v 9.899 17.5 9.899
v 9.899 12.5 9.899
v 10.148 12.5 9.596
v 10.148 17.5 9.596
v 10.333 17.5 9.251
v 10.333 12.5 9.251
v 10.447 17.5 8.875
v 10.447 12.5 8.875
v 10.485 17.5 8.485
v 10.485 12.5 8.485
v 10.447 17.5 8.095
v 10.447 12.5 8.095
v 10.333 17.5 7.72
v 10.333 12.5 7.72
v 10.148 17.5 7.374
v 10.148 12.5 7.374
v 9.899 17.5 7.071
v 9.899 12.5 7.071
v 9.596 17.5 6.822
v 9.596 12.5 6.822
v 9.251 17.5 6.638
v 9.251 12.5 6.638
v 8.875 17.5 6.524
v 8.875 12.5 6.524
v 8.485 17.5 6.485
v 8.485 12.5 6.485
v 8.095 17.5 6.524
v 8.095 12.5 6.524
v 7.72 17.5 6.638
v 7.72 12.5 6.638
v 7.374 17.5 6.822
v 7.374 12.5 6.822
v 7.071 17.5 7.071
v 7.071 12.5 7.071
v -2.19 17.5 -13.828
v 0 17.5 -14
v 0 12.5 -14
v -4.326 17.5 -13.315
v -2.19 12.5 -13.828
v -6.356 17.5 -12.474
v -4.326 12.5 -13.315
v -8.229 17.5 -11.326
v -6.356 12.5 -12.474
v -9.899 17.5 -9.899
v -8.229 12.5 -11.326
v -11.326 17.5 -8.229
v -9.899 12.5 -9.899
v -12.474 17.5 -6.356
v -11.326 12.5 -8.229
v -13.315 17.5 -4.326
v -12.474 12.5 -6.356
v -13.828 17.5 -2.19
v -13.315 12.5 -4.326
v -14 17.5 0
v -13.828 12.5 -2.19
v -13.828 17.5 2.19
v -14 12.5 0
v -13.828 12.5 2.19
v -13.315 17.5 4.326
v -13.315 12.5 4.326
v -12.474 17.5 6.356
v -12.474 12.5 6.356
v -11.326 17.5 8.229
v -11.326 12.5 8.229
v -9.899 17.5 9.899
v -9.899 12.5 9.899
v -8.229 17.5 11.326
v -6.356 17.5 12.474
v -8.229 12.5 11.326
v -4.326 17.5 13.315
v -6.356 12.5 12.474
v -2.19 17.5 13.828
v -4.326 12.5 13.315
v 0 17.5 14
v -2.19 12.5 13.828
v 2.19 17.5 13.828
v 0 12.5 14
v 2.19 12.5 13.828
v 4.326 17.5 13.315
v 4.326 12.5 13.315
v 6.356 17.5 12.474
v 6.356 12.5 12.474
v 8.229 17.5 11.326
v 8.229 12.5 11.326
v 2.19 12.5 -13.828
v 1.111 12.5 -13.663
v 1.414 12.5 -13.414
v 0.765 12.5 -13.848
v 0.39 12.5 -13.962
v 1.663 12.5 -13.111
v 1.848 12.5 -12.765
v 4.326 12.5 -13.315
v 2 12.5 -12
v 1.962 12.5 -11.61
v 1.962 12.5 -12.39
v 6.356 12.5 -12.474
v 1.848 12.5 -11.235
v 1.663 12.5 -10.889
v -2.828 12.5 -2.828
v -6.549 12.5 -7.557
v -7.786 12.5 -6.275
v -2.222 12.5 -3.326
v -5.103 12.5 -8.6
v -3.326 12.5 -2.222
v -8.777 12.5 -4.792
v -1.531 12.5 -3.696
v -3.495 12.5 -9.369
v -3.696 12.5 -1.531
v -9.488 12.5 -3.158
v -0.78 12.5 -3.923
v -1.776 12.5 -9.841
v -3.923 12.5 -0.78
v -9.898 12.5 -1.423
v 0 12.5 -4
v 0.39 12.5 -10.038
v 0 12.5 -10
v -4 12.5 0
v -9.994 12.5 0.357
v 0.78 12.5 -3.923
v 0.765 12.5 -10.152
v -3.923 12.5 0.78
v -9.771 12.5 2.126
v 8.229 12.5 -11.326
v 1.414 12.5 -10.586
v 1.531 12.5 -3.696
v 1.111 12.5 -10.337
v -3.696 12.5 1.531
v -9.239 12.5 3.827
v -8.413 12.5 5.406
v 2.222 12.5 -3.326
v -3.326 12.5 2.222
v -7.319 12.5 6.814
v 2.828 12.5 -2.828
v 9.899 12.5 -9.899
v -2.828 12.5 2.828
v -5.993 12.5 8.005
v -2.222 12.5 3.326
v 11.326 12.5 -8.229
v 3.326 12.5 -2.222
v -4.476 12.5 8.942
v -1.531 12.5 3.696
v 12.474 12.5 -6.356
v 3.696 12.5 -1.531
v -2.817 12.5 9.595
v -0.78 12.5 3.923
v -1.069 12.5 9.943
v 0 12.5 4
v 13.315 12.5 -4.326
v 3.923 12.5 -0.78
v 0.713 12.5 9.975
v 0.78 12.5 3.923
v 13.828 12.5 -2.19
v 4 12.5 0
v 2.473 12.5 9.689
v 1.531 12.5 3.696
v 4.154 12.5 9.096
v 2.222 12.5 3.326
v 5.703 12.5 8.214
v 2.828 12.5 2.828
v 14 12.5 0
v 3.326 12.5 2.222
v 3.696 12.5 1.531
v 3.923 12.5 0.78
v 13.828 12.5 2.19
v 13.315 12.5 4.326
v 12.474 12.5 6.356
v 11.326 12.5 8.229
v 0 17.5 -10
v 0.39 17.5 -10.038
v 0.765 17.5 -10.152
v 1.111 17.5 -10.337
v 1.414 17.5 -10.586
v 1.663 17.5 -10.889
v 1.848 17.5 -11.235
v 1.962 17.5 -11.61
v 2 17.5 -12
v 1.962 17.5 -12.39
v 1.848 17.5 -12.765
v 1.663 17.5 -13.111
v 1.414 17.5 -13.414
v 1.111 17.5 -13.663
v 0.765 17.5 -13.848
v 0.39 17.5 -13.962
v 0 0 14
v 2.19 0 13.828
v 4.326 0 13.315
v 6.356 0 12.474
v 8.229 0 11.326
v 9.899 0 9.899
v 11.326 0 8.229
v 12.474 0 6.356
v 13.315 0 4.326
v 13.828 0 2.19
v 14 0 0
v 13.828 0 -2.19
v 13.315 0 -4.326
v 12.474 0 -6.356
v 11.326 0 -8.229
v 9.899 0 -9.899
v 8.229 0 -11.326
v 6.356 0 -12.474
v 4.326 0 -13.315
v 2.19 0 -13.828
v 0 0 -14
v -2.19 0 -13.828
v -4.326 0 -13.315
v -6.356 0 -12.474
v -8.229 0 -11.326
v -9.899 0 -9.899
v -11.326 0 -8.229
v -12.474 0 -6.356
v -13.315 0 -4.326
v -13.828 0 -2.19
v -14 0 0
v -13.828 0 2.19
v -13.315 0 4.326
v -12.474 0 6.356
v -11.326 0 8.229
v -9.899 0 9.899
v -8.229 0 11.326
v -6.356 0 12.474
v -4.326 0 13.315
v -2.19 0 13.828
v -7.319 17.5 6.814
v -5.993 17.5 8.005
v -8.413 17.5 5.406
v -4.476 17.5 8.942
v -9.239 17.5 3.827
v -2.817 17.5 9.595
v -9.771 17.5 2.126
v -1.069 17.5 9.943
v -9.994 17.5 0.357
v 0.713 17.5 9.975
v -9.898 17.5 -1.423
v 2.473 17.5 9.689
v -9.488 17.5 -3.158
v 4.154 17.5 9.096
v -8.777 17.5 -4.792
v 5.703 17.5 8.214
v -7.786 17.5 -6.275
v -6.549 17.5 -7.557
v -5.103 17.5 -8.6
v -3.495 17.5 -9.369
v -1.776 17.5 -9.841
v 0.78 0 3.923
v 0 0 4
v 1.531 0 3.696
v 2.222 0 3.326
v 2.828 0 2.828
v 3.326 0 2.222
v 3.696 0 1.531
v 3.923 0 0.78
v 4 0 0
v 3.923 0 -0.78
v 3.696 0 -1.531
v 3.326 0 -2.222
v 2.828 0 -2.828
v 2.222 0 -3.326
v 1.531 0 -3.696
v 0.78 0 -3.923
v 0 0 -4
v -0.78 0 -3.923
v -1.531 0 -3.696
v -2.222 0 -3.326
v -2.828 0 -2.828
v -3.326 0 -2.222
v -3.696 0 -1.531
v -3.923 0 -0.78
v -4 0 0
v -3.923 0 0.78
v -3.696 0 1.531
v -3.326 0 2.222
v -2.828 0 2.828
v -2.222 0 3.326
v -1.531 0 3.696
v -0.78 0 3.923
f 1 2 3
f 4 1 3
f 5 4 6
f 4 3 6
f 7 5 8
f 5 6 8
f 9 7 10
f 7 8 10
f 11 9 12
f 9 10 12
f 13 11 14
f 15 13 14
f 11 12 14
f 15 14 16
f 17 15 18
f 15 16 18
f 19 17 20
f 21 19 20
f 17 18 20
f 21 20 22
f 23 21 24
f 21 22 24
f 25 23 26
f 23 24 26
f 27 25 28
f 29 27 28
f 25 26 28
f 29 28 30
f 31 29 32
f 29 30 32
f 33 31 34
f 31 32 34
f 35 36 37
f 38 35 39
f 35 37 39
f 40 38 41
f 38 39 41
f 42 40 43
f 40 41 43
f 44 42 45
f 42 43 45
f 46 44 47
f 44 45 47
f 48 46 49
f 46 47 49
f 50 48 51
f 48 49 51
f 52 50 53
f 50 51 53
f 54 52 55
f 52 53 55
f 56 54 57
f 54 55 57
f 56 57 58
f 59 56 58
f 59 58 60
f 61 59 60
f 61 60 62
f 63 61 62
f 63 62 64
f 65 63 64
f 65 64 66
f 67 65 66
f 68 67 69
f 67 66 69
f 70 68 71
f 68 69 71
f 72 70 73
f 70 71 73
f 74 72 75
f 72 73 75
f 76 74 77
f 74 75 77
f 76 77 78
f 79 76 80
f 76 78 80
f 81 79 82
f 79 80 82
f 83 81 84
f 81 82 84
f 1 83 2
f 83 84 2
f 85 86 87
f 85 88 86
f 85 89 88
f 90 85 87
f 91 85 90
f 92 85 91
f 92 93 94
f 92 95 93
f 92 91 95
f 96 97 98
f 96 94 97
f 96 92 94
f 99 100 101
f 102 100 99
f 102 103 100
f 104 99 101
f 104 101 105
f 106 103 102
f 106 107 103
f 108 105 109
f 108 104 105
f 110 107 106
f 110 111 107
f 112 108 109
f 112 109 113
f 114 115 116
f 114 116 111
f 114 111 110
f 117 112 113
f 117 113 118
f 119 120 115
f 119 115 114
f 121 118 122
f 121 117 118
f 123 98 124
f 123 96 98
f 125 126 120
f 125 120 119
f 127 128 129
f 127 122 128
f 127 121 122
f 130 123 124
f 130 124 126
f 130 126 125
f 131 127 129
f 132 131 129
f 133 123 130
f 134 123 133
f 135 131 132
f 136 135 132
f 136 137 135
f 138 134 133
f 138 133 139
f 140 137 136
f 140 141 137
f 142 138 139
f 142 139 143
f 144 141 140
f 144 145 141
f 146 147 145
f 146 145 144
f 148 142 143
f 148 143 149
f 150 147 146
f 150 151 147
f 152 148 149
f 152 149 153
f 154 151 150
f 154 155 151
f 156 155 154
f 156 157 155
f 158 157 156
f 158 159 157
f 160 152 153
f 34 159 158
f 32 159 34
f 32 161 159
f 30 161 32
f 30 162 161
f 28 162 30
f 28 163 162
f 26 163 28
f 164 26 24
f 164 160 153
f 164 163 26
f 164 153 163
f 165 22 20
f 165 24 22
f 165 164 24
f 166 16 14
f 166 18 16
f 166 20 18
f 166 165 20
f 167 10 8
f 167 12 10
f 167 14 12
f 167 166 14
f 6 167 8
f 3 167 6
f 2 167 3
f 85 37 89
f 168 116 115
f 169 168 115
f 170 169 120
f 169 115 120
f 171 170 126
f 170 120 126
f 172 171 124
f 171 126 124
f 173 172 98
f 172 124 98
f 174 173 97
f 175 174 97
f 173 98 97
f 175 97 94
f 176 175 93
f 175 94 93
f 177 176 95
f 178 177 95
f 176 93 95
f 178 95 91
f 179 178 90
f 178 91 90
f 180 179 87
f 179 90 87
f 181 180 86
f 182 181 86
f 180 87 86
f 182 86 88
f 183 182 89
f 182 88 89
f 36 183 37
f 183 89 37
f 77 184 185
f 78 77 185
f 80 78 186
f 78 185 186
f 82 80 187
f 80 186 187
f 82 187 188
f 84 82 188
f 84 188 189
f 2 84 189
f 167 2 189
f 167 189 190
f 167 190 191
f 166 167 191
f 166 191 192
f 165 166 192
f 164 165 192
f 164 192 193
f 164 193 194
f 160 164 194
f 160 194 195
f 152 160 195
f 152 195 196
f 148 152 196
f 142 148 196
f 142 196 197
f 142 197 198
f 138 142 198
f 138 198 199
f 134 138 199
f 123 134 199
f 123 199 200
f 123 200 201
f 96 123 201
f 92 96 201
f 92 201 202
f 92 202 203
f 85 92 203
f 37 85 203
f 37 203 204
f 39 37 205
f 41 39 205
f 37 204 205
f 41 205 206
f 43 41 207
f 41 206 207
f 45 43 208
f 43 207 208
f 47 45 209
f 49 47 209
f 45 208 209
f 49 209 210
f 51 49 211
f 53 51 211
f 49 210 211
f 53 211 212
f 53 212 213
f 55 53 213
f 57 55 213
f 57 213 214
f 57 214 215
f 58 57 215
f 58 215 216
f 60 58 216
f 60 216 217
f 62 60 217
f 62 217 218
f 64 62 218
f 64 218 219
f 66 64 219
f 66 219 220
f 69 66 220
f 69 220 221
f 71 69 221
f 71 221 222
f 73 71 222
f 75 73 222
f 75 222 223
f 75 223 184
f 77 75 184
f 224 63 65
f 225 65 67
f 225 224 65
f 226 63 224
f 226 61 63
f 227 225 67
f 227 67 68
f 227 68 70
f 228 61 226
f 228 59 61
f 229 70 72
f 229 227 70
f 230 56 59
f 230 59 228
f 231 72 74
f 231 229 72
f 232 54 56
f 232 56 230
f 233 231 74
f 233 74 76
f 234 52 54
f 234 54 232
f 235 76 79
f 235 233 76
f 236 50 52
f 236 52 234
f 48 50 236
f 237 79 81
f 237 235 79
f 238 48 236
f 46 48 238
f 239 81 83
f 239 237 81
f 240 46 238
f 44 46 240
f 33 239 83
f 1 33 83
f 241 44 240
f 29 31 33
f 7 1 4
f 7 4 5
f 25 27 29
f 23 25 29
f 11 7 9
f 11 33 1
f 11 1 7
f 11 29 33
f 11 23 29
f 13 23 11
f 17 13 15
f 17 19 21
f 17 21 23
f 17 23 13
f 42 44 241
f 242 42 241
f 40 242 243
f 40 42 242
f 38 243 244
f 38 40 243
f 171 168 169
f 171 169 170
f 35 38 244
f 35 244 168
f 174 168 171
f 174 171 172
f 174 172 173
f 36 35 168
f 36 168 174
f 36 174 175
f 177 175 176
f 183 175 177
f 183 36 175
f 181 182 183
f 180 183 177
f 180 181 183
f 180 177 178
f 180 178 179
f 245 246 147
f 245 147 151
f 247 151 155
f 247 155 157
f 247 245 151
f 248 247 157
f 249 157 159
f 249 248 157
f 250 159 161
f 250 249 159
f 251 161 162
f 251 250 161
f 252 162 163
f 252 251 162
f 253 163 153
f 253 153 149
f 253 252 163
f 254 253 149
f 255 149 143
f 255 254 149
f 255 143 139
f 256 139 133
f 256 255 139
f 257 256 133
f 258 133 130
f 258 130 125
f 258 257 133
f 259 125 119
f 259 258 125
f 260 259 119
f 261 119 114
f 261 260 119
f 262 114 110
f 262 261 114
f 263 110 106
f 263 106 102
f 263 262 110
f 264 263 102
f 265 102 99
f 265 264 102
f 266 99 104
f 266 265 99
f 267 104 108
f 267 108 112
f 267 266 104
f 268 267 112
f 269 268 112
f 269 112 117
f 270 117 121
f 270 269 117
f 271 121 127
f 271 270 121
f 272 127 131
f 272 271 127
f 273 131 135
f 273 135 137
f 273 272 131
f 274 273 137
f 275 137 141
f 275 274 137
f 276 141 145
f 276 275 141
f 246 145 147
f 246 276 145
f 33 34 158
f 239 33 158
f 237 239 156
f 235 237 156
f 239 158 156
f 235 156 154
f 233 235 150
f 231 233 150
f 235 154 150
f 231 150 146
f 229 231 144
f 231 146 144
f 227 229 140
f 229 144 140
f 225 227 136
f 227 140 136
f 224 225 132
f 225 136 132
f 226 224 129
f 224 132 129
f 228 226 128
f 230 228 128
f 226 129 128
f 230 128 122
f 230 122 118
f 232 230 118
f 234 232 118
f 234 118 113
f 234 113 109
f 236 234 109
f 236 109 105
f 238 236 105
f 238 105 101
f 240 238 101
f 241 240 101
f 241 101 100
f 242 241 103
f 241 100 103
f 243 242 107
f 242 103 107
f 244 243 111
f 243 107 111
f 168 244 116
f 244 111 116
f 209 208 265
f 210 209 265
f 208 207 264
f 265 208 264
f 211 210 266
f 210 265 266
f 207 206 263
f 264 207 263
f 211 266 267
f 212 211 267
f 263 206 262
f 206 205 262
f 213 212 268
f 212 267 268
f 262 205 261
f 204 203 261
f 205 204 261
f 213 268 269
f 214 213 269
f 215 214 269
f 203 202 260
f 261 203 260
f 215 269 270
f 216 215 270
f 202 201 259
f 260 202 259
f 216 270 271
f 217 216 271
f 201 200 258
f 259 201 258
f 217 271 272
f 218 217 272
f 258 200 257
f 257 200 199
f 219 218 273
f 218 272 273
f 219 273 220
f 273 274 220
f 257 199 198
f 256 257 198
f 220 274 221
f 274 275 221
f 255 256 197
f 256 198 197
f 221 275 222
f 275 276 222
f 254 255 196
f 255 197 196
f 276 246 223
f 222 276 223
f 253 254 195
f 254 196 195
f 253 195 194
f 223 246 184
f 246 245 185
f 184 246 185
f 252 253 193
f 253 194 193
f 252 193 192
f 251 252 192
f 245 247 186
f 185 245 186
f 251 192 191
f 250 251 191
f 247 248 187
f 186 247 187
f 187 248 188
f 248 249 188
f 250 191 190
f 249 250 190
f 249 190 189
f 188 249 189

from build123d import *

# Parameters (mm, degrees)
SKETCH5_R           = 14
SKETCH5_R_2         = 4
BOSS_EXTRUDE3_DEPTH = 12.5
BOSS_EXTRUDE4_DEPTH = 5


with BuildPart() as part:
    # Sketch5 → Boss-Extrude3 (new body)
    with BuildSketch(Plane(origin=(0, 0, 0), x_dir=(1, 0, 0), z_dir=(0, 1, 0))):
        with Locations(Location((0, 0, 0), (0, 0, 270))):
            Circle(SKETCH5_R)
        with Locations(Location((0, 0, 0), (0, 0, 270))):
            Circle(SKETCH5_R_2, mode=Mode.SUBTRACT)
    extrude(amount=BOSS_EXTRUDE3_DEPTH)

    # Sketch6 → Boss-Extrude4 (add)
    with BuildSketch(Plane(origin=(0, 12.5, 0), x_dir=(1, 0, 0), z_dir=(0, 1, 0))):
        with BuildLine():
            ThreePointArc((0, 14), (-12.934313455, -5.357568053), (9.899494937, -9.899494937))
            ThreePointArc((9.899494937, -9.899494937), (9.899494937, -7.071067812), (7.071067812, -7.071067812))
            ThreePointArc((7.071067812, -7.071067812), (-9.238795325, -3.826834324), (0, 10))
            ThreePointArc((0, 10), (2, 12), (0, 14))
        make_face()
    extrude(amount=BOSS_EXTRUDE4_DEPTH)


solid = part.part
